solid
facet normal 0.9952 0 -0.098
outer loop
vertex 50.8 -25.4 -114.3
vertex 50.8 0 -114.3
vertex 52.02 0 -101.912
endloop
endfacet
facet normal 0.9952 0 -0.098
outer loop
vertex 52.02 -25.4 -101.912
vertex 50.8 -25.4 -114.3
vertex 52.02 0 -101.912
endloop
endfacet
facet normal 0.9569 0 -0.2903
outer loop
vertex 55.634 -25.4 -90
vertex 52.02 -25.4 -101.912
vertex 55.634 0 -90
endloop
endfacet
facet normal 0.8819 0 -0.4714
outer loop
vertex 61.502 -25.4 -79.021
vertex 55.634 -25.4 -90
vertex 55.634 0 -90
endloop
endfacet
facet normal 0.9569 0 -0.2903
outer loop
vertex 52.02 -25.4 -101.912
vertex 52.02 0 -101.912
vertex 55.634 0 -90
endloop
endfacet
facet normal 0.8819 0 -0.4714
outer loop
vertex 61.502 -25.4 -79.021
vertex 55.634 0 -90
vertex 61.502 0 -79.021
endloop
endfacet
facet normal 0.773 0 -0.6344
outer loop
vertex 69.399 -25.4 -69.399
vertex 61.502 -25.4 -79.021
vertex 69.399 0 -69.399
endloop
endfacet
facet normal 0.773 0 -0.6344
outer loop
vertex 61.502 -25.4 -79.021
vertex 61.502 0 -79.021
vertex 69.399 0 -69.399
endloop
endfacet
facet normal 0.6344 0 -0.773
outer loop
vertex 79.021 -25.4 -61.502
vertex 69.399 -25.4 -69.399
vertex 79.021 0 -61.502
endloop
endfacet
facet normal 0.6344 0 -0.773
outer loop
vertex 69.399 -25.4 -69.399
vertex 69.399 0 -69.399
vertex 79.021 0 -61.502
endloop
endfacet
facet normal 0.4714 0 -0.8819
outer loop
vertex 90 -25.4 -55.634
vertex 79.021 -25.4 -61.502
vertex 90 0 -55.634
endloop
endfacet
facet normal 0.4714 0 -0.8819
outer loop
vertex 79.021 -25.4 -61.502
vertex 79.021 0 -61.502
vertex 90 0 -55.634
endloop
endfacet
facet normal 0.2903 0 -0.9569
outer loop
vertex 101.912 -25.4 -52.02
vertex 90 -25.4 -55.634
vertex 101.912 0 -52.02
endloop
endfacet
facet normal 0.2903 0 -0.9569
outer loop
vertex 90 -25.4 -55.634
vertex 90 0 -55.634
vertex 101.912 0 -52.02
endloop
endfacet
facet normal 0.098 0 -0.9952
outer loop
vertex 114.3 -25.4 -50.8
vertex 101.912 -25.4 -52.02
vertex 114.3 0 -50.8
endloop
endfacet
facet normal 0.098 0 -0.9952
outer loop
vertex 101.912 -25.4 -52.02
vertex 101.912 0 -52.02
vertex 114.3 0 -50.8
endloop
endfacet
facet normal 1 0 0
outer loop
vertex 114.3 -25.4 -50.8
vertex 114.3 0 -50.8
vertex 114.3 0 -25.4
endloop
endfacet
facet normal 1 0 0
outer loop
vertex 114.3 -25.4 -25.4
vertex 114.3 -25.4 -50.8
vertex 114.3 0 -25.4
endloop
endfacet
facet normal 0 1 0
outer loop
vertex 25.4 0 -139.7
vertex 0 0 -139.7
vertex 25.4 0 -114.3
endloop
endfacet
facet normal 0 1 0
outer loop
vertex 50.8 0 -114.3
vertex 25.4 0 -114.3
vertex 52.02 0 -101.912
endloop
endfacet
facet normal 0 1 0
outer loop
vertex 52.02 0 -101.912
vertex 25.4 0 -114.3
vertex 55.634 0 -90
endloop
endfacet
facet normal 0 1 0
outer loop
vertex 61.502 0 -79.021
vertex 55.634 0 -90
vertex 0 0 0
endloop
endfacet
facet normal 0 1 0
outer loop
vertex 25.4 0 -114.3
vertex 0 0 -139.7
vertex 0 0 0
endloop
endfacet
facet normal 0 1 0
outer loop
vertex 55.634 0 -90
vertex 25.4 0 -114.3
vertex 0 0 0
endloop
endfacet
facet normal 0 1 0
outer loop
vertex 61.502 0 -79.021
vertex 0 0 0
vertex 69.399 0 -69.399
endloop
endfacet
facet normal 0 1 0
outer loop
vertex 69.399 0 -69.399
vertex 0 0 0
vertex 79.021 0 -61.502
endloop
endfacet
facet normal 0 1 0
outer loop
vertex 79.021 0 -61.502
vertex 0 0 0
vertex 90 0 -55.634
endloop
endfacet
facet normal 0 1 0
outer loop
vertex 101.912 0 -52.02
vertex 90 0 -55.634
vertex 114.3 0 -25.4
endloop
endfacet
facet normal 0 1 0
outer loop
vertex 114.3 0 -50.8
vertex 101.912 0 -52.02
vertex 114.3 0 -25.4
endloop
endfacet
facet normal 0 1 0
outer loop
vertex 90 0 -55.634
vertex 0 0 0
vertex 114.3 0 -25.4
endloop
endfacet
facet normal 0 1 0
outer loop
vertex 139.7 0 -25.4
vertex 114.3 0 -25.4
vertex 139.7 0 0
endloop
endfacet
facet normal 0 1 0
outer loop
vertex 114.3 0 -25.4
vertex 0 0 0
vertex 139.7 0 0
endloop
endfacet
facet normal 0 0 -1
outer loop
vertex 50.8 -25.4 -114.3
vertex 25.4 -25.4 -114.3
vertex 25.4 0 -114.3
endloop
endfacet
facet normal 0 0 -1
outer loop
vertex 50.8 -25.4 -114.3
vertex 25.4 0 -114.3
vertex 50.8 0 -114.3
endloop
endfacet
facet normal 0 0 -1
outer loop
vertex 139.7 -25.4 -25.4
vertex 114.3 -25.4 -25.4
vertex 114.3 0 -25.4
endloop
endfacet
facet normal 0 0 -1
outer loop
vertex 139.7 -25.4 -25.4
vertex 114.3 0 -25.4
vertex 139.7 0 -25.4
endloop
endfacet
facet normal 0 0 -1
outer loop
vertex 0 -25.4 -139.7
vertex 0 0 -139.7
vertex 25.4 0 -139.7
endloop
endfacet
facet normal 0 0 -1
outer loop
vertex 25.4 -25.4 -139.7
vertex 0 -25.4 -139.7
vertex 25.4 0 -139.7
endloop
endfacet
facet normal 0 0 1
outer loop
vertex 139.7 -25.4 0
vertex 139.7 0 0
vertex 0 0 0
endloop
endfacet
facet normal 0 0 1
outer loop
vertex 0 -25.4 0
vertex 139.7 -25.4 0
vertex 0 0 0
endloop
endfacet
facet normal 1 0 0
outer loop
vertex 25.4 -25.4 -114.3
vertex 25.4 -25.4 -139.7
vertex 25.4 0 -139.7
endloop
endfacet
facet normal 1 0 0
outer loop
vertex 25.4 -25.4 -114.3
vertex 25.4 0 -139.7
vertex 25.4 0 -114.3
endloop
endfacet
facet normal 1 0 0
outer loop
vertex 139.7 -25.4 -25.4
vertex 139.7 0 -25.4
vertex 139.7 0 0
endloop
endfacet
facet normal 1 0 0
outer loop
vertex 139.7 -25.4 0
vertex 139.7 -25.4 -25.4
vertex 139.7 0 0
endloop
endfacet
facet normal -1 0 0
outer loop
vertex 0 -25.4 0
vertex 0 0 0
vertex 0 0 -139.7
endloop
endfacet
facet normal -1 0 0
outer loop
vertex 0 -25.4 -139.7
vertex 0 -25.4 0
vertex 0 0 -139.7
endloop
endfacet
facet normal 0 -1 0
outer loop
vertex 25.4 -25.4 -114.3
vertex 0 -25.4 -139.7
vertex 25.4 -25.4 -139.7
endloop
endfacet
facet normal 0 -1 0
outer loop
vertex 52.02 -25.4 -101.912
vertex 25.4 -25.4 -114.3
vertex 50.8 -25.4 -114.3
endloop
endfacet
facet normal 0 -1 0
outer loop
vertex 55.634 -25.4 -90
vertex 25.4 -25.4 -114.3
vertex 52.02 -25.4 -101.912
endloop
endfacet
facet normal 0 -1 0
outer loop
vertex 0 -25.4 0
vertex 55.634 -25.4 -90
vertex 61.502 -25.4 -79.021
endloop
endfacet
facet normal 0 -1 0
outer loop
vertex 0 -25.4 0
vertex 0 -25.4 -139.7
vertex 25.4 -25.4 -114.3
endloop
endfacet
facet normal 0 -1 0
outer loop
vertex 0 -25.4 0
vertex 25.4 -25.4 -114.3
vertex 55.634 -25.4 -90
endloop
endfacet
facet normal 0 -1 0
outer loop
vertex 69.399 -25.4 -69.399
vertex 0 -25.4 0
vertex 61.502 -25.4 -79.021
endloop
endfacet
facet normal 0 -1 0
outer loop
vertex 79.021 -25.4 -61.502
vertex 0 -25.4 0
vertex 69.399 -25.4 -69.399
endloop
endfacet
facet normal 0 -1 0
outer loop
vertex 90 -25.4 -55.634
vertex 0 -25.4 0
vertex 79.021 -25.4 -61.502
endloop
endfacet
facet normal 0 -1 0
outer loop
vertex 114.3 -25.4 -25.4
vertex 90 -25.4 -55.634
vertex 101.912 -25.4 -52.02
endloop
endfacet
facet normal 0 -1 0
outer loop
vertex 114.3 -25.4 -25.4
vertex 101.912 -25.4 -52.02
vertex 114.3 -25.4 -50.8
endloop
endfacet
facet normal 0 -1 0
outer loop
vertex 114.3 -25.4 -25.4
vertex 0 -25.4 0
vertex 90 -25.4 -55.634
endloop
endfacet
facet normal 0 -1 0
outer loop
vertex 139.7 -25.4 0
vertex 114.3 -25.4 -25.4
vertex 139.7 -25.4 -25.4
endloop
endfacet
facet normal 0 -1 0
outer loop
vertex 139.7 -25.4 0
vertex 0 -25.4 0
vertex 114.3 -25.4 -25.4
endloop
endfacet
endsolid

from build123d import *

# Parameters (mm, degrees)
F1_DEPTH = 25.4


with BuildPart() as f1:
    # F0 (on Front) → F1 (new body)
    with BuildSketch(Plane.XZ):
        with BuildLine():
            Line((139.7, 0), (0, 0))
            Line((0, 0), (0, -139.7))
            Line((0, -139.7), (25.4, -139.7))
            Line((25.4, -139.7), (25.4, -114.3))
            Line((25.4, -114.3), (50.8, -114.3))
            ThreePointArc((50.8, -114.3), (69.398719, -69.398719), (114.3, -50.8))
            Line((114.3, -50.8), (114.3, -25.4))
            Line((114.3, -25.4), (139.7, -25.4))
            Line((139.7, -25.4), (139.7, 0))
        make_face()
    extrude(amount=F1_DEPTH)


solid = f1.part
